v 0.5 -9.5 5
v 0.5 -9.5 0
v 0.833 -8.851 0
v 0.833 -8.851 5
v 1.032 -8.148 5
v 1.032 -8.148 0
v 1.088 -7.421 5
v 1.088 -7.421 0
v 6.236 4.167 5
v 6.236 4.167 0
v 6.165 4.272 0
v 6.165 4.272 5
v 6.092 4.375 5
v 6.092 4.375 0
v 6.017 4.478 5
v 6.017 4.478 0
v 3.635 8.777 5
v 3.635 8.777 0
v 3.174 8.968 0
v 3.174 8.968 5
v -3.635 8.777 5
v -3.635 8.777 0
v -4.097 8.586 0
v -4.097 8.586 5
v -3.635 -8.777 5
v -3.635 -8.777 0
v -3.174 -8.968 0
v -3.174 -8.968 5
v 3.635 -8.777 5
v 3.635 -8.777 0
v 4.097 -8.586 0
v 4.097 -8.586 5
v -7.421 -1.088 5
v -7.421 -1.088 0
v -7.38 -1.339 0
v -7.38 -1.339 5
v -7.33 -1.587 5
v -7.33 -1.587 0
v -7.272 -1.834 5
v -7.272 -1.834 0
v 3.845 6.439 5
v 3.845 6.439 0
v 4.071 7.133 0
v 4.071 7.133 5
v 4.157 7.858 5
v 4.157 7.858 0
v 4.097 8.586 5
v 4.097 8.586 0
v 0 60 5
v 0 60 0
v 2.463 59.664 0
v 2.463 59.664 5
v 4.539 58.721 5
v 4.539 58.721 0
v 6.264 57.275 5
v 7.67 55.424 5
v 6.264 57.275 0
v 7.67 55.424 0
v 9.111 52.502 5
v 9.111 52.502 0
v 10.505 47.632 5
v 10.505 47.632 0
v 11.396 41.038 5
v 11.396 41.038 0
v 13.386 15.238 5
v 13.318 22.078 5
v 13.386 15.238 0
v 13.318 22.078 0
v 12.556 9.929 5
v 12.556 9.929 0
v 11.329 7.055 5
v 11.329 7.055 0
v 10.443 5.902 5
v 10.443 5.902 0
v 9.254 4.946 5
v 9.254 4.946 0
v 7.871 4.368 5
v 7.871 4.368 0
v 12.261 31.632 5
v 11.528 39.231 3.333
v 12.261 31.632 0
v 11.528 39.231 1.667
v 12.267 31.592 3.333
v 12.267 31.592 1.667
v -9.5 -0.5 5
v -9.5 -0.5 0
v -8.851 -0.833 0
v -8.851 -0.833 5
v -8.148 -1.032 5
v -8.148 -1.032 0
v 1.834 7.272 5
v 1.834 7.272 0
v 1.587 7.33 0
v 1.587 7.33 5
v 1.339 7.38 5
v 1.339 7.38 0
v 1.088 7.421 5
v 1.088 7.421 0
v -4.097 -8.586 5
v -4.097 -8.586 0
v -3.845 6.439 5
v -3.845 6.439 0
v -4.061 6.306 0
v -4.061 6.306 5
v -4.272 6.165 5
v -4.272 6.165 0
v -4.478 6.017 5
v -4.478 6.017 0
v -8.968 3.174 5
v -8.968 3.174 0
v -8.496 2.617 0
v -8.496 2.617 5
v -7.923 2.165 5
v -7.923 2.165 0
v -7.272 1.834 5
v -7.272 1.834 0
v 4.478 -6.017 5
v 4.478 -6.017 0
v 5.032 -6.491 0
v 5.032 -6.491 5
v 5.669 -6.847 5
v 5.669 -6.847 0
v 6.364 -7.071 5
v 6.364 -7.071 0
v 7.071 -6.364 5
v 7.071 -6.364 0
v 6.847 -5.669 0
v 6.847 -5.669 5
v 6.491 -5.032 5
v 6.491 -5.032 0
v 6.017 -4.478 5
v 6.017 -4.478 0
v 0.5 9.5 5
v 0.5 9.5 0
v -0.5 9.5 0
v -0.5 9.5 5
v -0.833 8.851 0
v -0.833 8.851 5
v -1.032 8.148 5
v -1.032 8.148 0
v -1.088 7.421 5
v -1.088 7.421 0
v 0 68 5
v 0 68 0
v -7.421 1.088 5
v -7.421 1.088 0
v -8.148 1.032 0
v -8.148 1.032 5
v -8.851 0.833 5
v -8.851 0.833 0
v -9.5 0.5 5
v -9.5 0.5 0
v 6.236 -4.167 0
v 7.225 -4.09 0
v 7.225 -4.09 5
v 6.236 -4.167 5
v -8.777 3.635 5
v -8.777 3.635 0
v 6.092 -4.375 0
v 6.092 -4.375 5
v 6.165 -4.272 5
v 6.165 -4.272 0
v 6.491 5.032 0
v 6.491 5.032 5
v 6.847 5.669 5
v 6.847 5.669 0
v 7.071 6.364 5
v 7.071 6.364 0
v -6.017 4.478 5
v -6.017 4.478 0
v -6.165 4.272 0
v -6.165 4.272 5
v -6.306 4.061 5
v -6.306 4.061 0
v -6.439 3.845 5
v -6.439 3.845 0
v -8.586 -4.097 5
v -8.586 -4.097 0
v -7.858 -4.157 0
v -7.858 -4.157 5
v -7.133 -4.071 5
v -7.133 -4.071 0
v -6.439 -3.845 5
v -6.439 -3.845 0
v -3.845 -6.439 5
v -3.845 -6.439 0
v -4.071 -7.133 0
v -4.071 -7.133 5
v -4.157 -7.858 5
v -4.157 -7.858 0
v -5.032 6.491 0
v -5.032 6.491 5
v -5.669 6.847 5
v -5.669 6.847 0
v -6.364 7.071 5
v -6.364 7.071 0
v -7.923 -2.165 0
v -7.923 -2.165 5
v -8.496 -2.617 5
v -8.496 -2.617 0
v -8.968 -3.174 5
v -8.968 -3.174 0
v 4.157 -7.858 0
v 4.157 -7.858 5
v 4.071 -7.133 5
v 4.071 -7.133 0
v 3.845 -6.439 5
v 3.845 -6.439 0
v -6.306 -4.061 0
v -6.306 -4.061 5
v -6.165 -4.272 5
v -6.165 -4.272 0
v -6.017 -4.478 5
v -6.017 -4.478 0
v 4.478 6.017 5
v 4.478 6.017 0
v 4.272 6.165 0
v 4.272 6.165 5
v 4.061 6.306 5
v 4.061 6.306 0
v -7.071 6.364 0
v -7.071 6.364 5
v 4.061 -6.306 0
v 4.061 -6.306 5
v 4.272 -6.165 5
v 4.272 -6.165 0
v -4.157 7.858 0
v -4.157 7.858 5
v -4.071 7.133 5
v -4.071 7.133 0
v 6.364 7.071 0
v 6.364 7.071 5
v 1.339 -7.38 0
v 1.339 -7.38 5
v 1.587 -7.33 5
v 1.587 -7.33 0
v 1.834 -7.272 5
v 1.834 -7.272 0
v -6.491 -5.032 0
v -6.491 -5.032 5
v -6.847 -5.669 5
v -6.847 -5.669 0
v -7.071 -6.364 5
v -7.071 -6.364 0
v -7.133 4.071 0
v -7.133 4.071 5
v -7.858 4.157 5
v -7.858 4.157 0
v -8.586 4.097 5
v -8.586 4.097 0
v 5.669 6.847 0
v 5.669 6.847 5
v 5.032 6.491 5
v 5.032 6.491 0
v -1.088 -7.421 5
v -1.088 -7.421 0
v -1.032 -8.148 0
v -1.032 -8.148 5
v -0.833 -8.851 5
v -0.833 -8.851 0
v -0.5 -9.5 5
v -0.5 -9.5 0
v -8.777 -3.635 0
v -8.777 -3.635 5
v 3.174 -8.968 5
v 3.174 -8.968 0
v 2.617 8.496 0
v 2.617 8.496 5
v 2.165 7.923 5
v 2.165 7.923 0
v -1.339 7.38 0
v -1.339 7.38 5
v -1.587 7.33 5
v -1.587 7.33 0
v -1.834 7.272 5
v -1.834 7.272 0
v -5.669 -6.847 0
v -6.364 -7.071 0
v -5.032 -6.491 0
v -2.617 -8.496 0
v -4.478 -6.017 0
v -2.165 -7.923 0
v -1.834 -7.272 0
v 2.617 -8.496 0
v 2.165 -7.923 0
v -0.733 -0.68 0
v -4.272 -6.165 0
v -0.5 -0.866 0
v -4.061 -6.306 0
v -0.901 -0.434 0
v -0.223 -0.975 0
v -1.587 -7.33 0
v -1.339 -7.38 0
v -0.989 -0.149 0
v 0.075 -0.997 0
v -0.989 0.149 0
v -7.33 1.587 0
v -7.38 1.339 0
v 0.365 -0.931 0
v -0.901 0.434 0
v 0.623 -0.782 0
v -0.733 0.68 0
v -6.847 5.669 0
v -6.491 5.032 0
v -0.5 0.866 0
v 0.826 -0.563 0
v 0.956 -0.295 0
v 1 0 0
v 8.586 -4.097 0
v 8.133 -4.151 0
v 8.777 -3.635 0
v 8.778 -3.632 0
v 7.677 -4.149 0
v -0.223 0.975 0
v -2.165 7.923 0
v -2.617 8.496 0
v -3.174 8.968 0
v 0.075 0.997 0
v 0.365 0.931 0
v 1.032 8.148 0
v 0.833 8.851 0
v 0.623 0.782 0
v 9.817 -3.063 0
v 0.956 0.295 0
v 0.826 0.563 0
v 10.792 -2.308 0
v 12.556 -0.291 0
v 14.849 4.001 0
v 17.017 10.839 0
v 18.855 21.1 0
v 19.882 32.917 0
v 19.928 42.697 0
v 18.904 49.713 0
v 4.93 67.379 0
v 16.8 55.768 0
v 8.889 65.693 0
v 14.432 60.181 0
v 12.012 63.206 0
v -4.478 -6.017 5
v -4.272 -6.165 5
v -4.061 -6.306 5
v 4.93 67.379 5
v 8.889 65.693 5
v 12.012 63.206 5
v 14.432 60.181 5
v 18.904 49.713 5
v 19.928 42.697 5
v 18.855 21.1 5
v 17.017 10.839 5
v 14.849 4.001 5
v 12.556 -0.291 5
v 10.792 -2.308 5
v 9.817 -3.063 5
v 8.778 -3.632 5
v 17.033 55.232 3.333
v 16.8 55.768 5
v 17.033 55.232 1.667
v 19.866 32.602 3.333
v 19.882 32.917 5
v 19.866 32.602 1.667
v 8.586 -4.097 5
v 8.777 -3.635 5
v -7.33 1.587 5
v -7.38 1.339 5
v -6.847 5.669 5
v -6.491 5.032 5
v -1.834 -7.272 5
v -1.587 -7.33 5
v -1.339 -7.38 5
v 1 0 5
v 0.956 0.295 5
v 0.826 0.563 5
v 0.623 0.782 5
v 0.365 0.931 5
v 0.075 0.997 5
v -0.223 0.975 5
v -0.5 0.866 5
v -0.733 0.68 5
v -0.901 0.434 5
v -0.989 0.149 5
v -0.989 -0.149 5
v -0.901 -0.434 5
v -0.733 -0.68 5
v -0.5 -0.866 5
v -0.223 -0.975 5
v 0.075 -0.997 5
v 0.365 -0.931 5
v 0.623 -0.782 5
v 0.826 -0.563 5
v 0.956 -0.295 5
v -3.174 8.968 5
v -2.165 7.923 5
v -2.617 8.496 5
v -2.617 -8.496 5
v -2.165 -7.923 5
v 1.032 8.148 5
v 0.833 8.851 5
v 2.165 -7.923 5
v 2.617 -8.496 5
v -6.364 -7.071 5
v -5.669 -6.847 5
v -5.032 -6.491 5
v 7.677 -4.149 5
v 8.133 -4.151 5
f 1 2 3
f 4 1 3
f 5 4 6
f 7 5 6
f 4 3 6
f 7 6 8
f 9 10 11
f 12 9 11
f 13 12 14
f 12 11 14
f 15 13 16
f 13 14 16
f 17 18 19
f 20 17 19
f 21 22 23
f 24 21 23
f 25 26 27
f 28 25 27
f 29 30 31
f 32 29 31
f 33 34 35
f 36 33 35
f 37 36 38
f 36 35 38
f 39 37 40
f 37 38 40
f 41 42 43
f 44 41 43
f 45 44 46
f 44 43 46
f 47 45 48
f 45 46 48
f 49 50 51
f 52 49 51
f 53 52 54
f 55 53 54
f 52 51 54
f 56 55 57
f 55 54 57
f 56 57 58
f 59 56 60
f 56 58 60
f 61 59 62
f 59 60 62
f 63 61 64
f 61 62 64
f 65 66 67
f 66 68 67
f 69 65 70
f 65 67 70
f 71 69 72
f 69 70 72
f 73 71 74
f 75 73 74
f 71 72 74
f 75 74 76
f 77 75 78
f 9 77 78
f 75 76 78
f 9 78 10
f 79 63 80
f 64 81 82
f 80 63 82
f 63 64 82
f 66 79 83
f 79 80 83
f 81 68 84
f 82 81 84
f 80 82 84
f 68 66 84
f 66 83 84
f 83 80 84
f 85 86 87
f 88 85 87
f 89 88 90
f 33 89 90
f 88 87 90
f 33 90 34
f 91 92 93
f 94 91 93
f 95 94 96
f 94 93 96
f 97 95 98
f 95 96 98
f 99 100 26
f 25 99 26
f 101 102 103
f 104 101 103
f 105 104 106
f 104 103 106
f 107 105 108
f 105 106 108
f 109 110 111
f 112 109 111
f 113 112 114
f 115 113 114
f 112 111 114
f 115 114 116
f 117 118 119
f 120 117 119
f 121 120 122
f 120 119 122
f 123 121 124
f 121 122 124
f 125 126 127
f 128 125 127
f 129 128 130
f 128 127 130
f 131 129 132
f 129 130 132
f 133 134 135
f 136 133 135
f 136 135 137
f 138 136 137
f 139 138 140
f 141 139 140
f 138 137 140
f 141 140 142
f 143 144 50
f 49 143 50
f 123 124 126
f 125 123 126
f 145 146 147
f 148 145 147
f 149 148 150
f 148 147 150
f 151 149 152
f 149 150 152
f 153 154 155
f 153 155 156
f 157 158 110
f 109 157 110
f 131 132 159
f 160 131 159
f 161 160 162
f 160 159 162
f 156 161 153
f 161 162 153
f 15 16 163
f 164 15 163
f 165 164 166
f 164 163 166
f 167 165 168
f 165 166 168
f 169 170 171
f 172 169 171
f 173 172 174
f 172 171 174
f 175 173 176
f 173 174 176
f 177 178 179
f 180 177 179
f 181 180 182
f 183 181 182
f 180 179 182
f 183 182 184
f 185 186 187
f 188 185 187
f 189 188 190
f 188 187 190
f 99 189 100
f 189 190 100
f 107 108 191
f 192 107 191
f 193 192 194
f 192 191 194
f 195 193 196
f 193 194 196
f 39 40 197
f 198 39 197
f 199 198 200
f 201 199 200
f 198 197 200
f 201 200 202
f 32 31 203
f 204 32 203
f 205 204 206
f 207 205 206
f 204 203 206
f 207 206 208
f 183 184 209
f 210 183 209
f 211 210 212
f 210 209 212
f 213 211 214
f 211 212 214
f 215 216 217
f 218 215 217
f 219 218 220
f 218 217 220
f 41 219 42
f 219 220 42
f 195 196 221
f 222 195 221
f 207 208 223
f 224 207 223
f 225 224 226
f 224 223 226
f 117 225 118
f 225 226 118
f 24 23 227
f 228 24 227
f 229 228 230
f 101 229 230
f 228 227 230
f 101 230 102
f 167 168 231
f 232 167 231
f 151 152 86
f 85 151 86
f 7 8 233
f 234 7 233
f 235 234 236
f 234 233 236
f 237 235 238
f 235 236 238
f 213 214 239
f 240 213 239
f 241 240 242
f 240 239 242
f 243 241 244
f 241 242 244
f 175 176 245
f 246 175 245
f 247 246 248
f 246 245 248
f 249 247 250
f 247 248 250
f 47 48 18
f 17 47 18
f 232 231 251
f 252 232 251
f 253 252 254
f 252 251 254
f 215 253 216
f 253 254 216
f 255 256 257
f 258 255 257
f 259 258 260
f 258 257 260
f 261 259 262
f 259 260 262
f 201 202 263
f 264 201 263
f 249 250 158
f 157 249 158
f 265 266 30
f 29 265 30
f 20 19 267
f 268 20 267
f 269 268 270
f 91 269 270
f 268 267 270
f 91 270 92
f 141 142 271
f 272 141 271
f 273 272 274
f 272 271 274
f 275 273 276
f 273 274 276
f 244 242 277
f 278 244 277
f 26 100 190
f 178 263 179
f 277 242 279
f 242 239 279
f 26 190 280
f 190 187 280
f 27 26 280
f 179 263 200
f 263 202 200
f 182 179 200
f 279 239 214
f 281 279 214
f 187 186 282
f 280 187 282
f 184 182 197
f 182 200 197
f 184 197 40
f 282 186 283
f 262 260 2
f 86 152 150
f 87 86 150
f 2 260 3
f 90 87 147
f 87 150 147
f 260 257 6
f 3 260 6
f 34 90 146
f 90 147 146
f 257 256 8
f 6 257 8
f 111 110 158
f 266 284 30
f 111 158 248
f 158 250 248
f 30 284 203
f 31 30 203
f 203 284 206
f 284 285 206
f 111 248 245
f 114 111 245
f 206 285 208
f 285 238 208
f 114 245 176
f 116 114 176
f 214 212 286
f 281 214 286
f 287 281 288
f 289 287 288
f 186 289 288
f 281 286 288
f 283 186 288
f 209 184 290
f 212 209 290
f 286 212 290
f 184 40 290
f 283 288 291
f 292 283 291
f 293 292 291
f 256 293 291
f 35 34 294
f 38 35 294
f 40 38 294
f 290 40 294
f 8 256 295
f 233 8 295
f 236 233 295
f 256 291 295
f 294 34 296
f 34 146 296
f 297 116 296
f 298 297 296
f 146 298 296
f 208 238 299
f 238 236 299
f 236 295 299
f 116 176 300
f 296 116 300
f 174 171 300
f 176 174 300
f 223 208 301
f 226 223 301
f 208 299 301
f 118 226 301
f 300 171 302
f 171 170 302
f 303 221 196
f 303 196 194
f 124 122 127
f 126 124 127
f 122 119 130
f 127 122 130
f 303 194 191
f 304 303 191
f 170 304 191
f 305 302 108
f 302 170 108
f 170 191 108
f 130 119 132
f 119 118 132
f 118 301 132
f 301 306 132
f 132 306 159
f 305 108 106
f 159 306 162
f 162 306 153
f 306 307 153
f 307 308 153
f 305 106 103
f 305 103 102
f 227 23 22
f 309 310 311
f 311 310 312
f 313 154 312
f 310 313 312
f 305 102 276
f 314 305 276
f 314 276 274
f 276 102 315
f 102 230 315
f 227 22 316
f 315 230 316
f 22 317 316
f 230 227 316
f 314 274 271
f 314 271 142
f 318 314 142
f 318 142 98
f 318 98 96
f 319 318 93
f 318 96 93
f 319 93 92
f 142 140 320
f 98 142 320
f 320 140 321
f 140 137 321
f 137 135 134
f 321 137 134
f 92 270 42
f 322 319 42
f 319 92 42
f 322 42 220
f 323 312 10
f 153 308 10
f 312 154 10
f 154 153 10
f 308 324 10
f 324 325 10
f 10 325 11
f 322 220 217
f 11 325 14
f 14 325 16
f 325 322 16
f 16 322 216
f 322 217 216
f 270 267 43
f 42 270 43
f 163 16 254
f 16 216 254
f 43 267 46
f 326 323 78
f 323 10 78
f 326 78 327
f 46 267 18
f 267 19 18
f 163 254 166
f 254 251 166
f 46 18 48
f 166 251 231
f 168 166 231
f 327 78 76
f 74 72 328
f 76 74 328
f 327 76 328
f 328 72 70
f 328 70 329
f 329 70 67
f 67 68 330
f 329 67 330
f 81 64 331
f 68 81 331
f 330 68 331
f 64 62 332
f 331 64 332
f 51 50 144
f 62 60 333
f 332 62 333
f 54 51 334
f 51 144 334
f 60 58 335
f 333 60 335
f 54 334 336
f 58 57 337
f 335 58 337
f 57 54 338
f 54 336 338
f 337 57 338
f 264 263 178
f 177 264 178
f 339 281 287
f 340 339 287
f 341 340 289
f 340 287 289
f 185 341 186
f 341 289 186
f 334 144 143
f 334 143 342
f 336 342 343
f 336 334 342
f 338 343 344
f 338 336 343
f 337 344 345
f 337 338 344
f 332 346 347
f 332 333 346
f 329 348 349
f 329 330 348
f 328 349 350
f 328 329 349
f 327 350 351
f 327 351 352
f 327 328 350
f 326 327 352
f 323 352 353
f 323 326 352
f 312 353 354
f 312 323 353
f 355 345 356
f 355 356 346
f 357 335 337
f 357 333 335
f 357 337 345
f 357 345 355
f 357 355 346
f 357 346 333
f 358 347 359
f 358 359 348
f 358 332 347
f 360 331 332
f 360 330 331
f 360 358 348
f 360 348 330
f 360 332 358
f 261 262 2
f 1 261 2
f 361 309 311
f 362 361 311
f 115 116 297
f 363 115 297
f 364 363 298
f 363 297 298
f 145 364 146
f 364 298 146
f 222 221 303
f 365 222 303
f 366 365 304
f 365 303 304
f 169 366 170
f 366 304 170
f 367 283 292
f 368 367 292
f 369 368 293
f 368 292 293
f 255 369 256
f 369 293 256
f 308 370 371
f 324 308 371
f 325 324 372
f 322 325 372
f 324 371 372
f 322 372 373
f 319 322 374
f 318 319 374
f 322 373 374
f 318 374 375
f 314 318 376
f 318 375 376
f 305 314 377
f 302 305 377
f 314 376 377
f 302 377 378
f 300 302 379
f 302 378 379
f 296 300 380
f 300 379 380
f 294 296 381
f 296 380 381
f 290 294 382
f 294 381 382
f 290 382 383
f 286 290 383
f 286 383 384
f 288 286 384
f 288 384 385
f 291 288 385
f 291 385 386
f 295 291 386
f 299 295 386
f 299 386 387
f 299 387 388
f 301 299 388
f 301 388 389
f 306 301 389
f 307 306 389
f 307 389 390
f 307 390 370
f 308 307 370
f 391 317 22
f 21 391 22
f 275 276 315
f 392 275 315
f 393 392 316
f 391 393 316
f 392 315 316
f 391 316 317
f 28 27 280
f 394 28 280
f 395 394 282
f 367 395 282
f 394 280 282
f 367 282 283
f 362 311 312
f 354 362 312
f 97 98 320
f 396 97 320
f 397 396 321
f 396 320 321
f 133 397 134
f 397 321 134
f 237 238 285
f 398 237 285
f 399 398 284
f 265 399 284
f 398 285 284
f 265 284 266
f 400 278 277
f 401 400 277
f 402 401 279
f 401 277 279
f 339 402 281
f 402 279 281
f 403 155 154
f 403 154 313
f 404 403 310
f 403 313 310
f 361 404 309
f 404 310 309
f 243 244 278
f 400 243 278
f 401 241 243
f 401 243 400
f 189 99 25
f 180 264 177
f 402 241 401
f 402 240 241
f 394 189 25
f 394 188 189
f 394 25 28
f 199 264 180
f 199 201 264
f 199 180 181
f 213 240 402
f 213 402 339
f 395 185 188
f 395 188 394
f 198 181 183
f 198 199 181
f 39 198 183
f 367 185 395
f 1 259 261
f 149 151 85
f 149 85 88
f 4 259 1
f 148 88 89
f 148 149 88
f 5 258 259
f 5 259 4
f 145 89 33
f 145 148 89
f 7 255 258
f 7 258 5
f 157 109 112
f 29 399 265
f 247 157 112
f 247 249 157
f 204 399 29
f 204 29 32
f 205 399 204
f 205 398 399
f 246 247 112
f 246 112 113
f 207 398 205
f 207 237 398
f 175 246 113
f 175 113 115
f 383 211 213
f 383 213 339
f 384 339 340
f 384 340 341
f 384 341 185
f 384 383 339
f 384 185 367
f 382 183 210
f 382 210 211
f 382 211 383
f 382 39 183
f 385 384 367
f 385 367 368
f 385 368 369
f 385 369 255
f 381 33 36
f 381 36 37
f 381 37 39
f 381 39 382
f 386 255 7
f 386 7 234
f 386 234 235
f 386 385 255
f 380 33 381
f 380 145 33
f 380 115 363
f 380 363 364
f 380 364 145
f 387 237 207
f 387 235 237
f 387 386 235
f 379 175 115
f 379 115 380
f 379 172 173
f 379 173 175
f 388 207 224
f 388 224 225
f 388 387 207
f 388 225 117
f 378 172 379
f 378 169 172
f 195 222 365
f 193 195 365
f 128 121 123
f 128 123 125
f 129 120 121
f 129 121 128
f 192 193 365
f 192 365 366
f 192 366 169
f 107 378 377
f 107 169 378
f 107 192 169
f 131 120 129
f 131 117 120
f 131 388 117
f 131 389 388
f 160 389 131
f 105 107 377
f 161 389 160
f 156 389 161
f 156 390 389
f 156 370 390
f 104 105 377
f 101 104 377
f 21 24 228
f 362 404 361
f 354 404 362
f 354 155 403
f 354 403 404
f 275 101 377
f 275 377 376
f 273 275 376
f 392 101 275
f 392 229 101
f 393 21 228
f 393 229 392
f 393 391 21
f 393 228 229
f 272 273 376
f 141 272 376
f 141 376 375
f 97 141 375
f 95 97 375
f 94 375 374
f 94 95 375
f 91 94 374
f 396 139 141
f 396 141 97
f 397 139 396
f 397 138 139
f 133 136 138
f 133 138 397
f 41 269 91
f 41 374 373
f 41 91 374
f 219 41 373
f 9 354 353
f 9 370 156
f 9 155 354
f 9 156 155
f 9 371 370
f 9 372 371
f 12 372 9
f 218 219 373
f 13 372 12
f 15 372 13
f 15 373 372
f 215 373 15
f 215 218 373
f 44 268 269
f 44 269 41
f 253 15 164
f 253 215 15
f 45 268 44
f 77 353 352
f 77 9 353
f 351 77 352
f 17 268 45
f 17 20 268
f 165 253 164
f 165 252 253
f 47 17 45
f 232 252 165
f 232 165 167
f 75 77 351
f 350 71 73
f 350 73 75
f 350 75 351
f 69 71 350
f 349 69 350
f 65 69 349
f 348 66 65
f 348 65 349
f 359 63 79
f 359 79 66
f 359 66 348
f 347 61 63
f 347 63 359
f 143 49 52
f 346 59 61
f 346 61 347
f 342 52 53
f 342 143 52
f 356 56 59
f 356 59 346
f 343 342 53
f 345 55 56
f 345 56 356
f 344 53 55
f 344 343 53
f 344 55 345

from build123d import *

# Parameters (mm, degrees)
F1_DEPTH = 5
F2_R     = 1
F3_DEPTH = 5.001
F5_DEPTH = 5


with BuildPart() as f1:
    # F0 (on Top) → F1 (new body)
    with BuildSketch(Plane.XY):
        with BuildLine():
            ThreePointArc((7.4206173165, -1.0883191822), (7.4801280027, -0.5456052265), (7.5, 0))
            ThreePointArc((7.5, 0), (7.4801280027, 0.5456052265), (7.4206173165, 1.0883191822))
            ThreePointArc((7.4206173165, 1.0883191822), (7.355889603, 1.4631774151), (7.2722381774, 1.8342714877))
            ThreePointArc((7.2722381774, 1.8342714877), (6.9290964938, 2.8701257427), (6.4392747372, 3.8452231222))
            ThreePointArc((6.4392747372, 3.8452231222), (6.2360220923, 4.1667767476), (6.0167266989, 4.4776109513))
            ThreePointArc((6.0167266989, 4.4776109513), (5.3033008589, 5.3033008589), (4.4776109513, 6.0167266989))
            ThreePointArc((4.4776109513, 6.0167266989), (4.1667767476, 6.2360220923), (3.8452231222, 6.4392747372))
            ThreePointArc((3.8452231222, 6.4392747372), (2.8701257427, 6.9290964938), (1.8342714877, 7.2722381774))
            ThreePointArc((1.8342714877, 7.2722381774), (1.4631774151, 7.355889603), (1.0883191822, 7.4206173165))
            ThreePointArc((1.0883191822, 7.4206173165), (0, 7.5), (-1.0883191822, 7.4206173165))
            ThreePointArc((-1.0883191822, 7.4206173165), (-1.4631774151, 7.355889603), (-1.8342714877, 7.2722381774))
            ThreePointArc((-1.8342714877, 7.2722381774), (-2.8701257427, 6.9290964938), (-3.8452231222, 6.4392747372))
            ThreePointArc((-3.8452231222, 6.4392747372), (-4.1667767476, 6.2360220923), (-4.4776109513, 6.0167266989))
            ThreePointArc((-4.4776109513, 6.0167266989), (-5.3033008589, 5.3033008589), (-6.0167266989, 4.4776109513))
            ThreePointArc((-6.0167266989, 4.4776109513), (-6.2360220923, 4.1667767476), (-6.4392747372, 3.8452231222))
            ThreePointArc((-6.4392747372, 3.8452231222), (-6.9290964938, 2.8701257427), (-7.2722381774, 1.8342714877))
            ThreePointArc((-7.2722381774, 1.8342714877), (-7.355889603, 1.4631774151), (-7.4206173165, 1.0883191822))
            ThreePointArc((-7.4206173165, 1.0883191822), (-7.5, 0), (-7.4206173165, -1.0883191822))
            ThreePointArc((-7.4206173165, -1.0883191822), (-7.355889603, -1.4631774151), (-7.2722381774, -1.8342714877))
            ThreePointArc((-7.2722381774, -1.8342714877), (-6.9290964938, -2.8701257427), (-6.4392747372, -3.8452231222))
            ThreePointArc((-6.4392747372, -3.8452231222), (-6.2360220923, -4.1667767476), (-6.0167266989, -4.4776109513))
            ThreePointArc((-6.0167266989, -4.4776109513), (-5.3033008589, -5.3033008589), (-4.4776109513, -6.0167266989))
            ThreePointArc((-4.4776109513, -6.0167266989), (-4.1667767476, -6.2360220923), (-3.8452231222, -6.4392747372))
            ThreePointArc((-3.8452231222, -6.4392747372), (-2.8701257427, -6.9290964938), (-1.8342714877, -7.2722381774))
            ThreePointArc((-1.8342714877, -7.2722381774), (-1.4631774151, -7.355889603), (-1.0883191822, -7.4206173165))
            ThreePointArc((-1.0883191822, -7.4206173165), (0, -7.5), (1.0883191822, -7.4206173165))
            ThreePointArc((1.0883191822, -7.4206173165), (1.4631774151, -7.355889603), (1.8342714877, -7.2722381774))
            ThreePointArc((1.8342714877, -7.2722381774), (2.8701257427, -6.9290964938), (3.8452231222, -6.4392747372))
            ThreePointArc((3.8452231222, -6.4392747372), (4.1667767476, -6.2360220923), (4.4776109513, -6.0167266989))
            ThreePointArc((4.4776109513, -6.0167266989), (5.3033008589, -5.3033008589), (6.0167266989, -4.4776109513))
            ThreePointArc((6.0167266989, -4.4776109513), (6.2360220923, -4.1667767476), (6.4392747372, -3.8452231222))
            ThreePointArc((6.4392747372, -3.8452231222), (6.9290964938, -2.8701257427), (7.2722381774, -1.8342714877))
            ThreePointArc((7.2722381774, -1.8342714877), (7.355889603, -1.4631774151), (7.4206173165, -1.0883191822))
        make_face()
        with BuildLine():
            ThreePointArc((7.4206173165, 1.0883191822), (7.4801280027, 0.5456052265), (7.5, 0))
            ThreePointArc((7.5, 0), (7.4801280027, -0.5456052265), (7.4206173165, -1.0883191822))
            ThreePointArc((7.4206173165, -1.0883191822), (8.5043518229, -0.9498278009), (9.5, -0.5))
            Line((9.5, -0.5), (9.5, 0))
            Line((9.5, 0), (9.5, 0.5))
            ThreePointArc((9.5, 0.5), (8.5043518229, 0.9498278009), (7.4206173165, 1.0883191822))
        make_face()
        with BuildLine():
            ThreePointArc((6.4392747372, 3.8452231222), (6.9290964938, 2.8701257427), (7.2722381774, 1.8342714877))
            ThreePointArc((7.2722381774, 1.8342714877), (8.2204799494, 2.376948081), (8.968197275, 3.1735528412))
            Line((8.968197275, 3.1735528412), (8.7768555589, 3.6354926075))
            Line((8.7768555589, 3.6354926075), (8.5855138427, 4.0974323737))
            ThreePointArc((8.5855138427, 4.0974323737), (7.4935132234, 4.1320010103), (6.4392747372, 3.8452231222))
        make_face()
        with BuildLine():
            ThreePointArc((8.968197275, -3.1735528412), (8.2204799494, -2.376948081), (7.2722381774, -1.8342714877))
            ThreePointArc((7.2722381774, -1.8342714877), (6.9290964938, -2.8701257427), (6.4392747372, -3.8452231222))
            ThreePointArc((6.4392747372, -3.8452231222), (7.4935132234, -4.1320010103), (8.5855138427, -4.0974323737))
            Line((8.5855138427, -4.0974323737), (8.7768555589, -3.6354926075))
            Line((8.7768555589, -3.6354926075), (8.968197275, -3.1735528412))
        make_face()
        with BuildLine():
            ThreePointArc((4.4776109513, 6.0167266989), (5.3033008589, 5.3033008589), (6.0167266989, 4.4776109513))
            ThreePointArc((6.0167266989, 4.4776109513), (6.6851145225, 5.3418551646), (7.0710678119, 6.3639610307))
            Line((7.0710678119, 6.3639610307), (6.7175144213, 6.7175144213))
            Line((6.7175144213, 6.7175144213), (6.3639610307, 7.0710678119))
            ThreePointArc((6.3639610307, 7.0710678119), (5.3418551646, 6.6851145225), (4.4776109513, 6.0167266989))
        make_face()
        with BuildLine():
            ThreePointArc((7.0710678119, -6.3639610307), (6.6851145225, -5.3418551646), (6.0167266989, -4.4776109513))
            ThreePointArc((6.0167266989, -4.4776109513), (5.3033008589, -5.3033008589), (4.4776109513, -6.0167266989))
            ThreePointArc((4.4776109513, -6.0167266989), (5.3418551646, -6.6851145225), (6.3639610307, -7.0710678119))
            Line((6.3639610307, -7.0710678119), (6.7175144213, -6.7175144213))
            Line((6.7175144213, -6.7175144213), (7.0710678119, -6.3639610307))
        make_face()
        with BuildLine():
            ThreePointArc((1.8342714877, 7.2722381774), (2.8701257427, 6.9290964938), (3.8452231222, 6.4392747372))
            ThreePointArc((3.8452231222, 6.4392747372), (4.1320010103, 7.4935132234), (4.0974323737, 8.5855138427))
            Line((4.0974323737, 8.5855138427), (3.6354926075, 8.7768555589))
            Line((3.6354926075, 8.7768555589), (3.1735528412, 8.968197275))
            ThreePointArc((3.1735528412, 8.968197275), (2.376948081, 8.2204799494), (1.8342714877, 7.2722381774))
        make_face()
        with BuildLine():
            ThreePointArc((4.0974323737, -8.5855138427), (4.1320010103, -7.4935132234), (3.8452231222, -6.4392747372))
            ThreePointArc((3.8452231222, -6.4392747372), (2.8701257427, -6.9290964938), (1.8342714877, -7.2722381774))
            ThreePointArc((1.8342714877, -7.2722381774), (2.376948081, -8.2204799494), (3.1735528412, -8.968197275))
            Line((3.1735528412, -8.968197275), (3.6354926075, -8.7768555589))
            Line((3.6354926075, -8.7768555589), (4.0974323737, -8.5855138427))
        make_face()
        with BuildLine():
            ThreePointArc((-1.0883191822, 7.4206173165), (0, 7.5), (1.0883191822, 7.4206173165))
            ThreePointArc((1.0883191822, 7.4206173165), (0.9498278009, 8.5043518229), (0.5, 9.5))
            Line((0.5, 9.5), (0, 9.5))
            Line((0, 9.5), (-0.5, 9.5))
            ThreePointArc((-0.5, 9.5), (-0.9498278009, 8.5043518229), (-1.0883191822, 7.4206173165))
        make_face()
        with BuildLine():
            ThreePointArc((0.5, -9.5), (0.9498278009, -8.5043518229), (1.0883191822, -7.4206173165))
            ThreePointArc((1.0883191822, -7.4206173165), (0, -7.5), (-1.0883191822, -7.4206173165))
            ThreePointArc((-1.0883191822, -7.4206173165), (-0.9498278009, -8.5043518229), (-0.5, -9.5))
            Line((-0.5, -9.5), (0, -9.5))
            Line((0, -9.5), (0.5, -9.5))
        make_face()
        with BuildLine():
            ThreePointArc((-3.8452231222, 6.4392747372), (-2.8701257427, 6.9290964938), (-1.8342714877, 7.2722381774))
            ThreePointArc((-1.8342714877, 7.2722381774), (-2.376948081, 8.2204799494), (-3.1735528412, 8.968197275))
            Line((-3.1735528412, 8.968197275), (-3.6354926075, 8.7768555589))
            Line((-3.6354926075, 8.7768555589), (-4.0974323737, 8.5855138427))
            ThreePointArc((-4.0974323737, 8.5855138427), (-4.1320010103, 7.4935132234), (-3.8452231222, 6.4392747372))
        make_face()
        with BuildLine():
            ThreePointArc((-3.1735528412, -8.968197275), (-2.376948081, -8.2204799494), (-1.8342714877, -7.2722381774))
            ThreePointArc((-1.8342714877, -7.2722381774), (-2.8701257427, -6.9290964938), (-3.8452231222, -6.4392747372))
            ThreePointArc((-3.8452231222, -6.4392747372), (-4.1320010103, -7.4935132234), (-4.0974323737, -8.5855138427))
            Line((-4.0974323737, -8.5855138427), (-3.6354926075, -8.7768555589))
            Line((-3.6354926075, -8.7768555589), (-3.1735528412, -8.968197275))
        make_face()
        with BuildLine():
            ThreePointArc((-6.0167266989, 4.4776109513), (-5.3033008589, 5.3033008589), (-4.4776109513, 6.0167266989))
            ThreePointArc((-4.4776109513, 6.0167266989), (-5.3418551646, 6.6851145225), (-6.3639610307, 7.0710678119))
            Line((-6.3639610307, 7.0710678119), (-6.7175144213, 6.7175144213))
            Line((-6.7175144213, 6.7175144213), (-7.0710678119, 6.3639610307))
            ThreePointArc((-7.0710678119, 6.3639610307), (-6.6851145225, 5.3418551646), (-6.0167266989, 4.4776109513))
        make_face()
        with BuildLine():
            ThreePointArc((-6.3639610307, -7.0710678119), (-5.3418551646, -6.6851145225), (-4.4776109513, -6.0167266989))
            ThreePointArc((-4.4776109513, -6.0167266989), (-5.3033008589, -5.3033008589), (-6.0167266989, -4.4776109513))
            ThreePointArc((-6.0167266989, -4.4776109513), (-6.6851145225, -5.3418551646), (-7.0710678119, -6.3639610307))
            Line((-7.0710678119, -6.3639610307), (-6.7175144213, -6.7175144213))
            Line((-6.7175144213, -6.7175144213), (-6.3639610307, -7.0710678119))
        make_face()
        with BuildLine():
            ThreePointArc((-7.2722381774, 1.8342714877), (-6.9290964938, 2.8701257427), (-6.4392747372, 3.8452231222))
            ThreePointArc((-6.4392747372, 3.8452231222), (-7.4935132234, 4.1320010103), (-8.5855138427, 4.0974323737))
            Line((-8.5855138427, 4.0974323737), (-8.7768555589, 3.6354926075))
            Line((-8.7768555589, 3.6354926075), (-8.968197275, 3.1735528412))
            ThreePointArc((-8.968197275, 3.1735528412), (-8.2204799494, 2.376948081), (-7.2722381774, 1.8342714877))
        make_face()
        with BuildLine():
            ThreePointArc((-8.5855138427, -4.0974323737), (-7.4935132234, -4.1320010103), (-6.4392747372, -3.8452231222))
            ThreePointArc((-6.4392747372, -3.8452231222), (-6.9290964938, -2.8701257427), (-7.2722381774, -1.8342714877))
            ThreePointArc((-7.2722381774, -1.8342714877), (-8.2204799494, -2.376948081), (-8.968197275, -3.1735528412))
            Line((-8.968197275, -3.1735528412), (-8.7768555589, -3.6354926075))
            Line((-8.7768555589, -3.6354926075), (-8.5855138427, -4.0974323737))
        make_face()
        with BuildLine():
            ThreePointArc((-7.4206173165, -1.0883191822), (-7.5, 0), (-7.4206173165, 1.0883191822))
            ThreePointArc((-7.4206173165, 1.0883191822), (-8.5043518229, 0.9498278009), (-9.5, 0.5))
            Line((-9.5, 0.5), (-9.5, 0))
            Line((-9.5, 0), (-9.5, -0.5))
            ThreePointArc((-9.5, -0.5), (-8.5043518229, -0.9498278009), (-7.4206173165, -1.0883191822))
        make_face()
    extrude(amount=F1_DEPTH)

    # F2 (on face) → F3 (cut, through all)
    with BuildSketch(Plane.XY.offset(5)):
        Circle(F2_R)
    extrude(amount=-F3_DEPTH, mode=Mode.SUBTRACT)

    # F4 (on Top) → F5 (join, through all)
    with BuildSketch(Plane.XY):
        with BuildLine():
            Line((0, 68), (0, 60))
            add(Edge.make_bspline(
                [(0, 60), (10, 60), (11.7747784616, 36.641096379), (11.7195041535, 34.6490253416), (16.2360220923, 4.1667767476), (6.2360220923, 4.1667767476)],
                knots=[0, 0, 0, 0, 0.3765565643, 0.5905875626, 1, 1, 1, 1], degree=3))
            Line((6.2360220923, 4.1667767476), (6.2360220923, -4.1667767476))
            add(Edge.make_bspline(
                [(0, 68), (10, 68), (19.0348554769, 54.3871049974), (21.3475598799, 35.9103301278), (16.2360220923, -4.1667767476), (6.2360220923, -4.1667767476)],
                knots=[0, 0, 0, 0, 0.2947790511, 0.5999067534, 1, 1, 1, 1], degree=3))
        make_face()
    extrude(amount=F5_DEPTH)


solid = f1.part
